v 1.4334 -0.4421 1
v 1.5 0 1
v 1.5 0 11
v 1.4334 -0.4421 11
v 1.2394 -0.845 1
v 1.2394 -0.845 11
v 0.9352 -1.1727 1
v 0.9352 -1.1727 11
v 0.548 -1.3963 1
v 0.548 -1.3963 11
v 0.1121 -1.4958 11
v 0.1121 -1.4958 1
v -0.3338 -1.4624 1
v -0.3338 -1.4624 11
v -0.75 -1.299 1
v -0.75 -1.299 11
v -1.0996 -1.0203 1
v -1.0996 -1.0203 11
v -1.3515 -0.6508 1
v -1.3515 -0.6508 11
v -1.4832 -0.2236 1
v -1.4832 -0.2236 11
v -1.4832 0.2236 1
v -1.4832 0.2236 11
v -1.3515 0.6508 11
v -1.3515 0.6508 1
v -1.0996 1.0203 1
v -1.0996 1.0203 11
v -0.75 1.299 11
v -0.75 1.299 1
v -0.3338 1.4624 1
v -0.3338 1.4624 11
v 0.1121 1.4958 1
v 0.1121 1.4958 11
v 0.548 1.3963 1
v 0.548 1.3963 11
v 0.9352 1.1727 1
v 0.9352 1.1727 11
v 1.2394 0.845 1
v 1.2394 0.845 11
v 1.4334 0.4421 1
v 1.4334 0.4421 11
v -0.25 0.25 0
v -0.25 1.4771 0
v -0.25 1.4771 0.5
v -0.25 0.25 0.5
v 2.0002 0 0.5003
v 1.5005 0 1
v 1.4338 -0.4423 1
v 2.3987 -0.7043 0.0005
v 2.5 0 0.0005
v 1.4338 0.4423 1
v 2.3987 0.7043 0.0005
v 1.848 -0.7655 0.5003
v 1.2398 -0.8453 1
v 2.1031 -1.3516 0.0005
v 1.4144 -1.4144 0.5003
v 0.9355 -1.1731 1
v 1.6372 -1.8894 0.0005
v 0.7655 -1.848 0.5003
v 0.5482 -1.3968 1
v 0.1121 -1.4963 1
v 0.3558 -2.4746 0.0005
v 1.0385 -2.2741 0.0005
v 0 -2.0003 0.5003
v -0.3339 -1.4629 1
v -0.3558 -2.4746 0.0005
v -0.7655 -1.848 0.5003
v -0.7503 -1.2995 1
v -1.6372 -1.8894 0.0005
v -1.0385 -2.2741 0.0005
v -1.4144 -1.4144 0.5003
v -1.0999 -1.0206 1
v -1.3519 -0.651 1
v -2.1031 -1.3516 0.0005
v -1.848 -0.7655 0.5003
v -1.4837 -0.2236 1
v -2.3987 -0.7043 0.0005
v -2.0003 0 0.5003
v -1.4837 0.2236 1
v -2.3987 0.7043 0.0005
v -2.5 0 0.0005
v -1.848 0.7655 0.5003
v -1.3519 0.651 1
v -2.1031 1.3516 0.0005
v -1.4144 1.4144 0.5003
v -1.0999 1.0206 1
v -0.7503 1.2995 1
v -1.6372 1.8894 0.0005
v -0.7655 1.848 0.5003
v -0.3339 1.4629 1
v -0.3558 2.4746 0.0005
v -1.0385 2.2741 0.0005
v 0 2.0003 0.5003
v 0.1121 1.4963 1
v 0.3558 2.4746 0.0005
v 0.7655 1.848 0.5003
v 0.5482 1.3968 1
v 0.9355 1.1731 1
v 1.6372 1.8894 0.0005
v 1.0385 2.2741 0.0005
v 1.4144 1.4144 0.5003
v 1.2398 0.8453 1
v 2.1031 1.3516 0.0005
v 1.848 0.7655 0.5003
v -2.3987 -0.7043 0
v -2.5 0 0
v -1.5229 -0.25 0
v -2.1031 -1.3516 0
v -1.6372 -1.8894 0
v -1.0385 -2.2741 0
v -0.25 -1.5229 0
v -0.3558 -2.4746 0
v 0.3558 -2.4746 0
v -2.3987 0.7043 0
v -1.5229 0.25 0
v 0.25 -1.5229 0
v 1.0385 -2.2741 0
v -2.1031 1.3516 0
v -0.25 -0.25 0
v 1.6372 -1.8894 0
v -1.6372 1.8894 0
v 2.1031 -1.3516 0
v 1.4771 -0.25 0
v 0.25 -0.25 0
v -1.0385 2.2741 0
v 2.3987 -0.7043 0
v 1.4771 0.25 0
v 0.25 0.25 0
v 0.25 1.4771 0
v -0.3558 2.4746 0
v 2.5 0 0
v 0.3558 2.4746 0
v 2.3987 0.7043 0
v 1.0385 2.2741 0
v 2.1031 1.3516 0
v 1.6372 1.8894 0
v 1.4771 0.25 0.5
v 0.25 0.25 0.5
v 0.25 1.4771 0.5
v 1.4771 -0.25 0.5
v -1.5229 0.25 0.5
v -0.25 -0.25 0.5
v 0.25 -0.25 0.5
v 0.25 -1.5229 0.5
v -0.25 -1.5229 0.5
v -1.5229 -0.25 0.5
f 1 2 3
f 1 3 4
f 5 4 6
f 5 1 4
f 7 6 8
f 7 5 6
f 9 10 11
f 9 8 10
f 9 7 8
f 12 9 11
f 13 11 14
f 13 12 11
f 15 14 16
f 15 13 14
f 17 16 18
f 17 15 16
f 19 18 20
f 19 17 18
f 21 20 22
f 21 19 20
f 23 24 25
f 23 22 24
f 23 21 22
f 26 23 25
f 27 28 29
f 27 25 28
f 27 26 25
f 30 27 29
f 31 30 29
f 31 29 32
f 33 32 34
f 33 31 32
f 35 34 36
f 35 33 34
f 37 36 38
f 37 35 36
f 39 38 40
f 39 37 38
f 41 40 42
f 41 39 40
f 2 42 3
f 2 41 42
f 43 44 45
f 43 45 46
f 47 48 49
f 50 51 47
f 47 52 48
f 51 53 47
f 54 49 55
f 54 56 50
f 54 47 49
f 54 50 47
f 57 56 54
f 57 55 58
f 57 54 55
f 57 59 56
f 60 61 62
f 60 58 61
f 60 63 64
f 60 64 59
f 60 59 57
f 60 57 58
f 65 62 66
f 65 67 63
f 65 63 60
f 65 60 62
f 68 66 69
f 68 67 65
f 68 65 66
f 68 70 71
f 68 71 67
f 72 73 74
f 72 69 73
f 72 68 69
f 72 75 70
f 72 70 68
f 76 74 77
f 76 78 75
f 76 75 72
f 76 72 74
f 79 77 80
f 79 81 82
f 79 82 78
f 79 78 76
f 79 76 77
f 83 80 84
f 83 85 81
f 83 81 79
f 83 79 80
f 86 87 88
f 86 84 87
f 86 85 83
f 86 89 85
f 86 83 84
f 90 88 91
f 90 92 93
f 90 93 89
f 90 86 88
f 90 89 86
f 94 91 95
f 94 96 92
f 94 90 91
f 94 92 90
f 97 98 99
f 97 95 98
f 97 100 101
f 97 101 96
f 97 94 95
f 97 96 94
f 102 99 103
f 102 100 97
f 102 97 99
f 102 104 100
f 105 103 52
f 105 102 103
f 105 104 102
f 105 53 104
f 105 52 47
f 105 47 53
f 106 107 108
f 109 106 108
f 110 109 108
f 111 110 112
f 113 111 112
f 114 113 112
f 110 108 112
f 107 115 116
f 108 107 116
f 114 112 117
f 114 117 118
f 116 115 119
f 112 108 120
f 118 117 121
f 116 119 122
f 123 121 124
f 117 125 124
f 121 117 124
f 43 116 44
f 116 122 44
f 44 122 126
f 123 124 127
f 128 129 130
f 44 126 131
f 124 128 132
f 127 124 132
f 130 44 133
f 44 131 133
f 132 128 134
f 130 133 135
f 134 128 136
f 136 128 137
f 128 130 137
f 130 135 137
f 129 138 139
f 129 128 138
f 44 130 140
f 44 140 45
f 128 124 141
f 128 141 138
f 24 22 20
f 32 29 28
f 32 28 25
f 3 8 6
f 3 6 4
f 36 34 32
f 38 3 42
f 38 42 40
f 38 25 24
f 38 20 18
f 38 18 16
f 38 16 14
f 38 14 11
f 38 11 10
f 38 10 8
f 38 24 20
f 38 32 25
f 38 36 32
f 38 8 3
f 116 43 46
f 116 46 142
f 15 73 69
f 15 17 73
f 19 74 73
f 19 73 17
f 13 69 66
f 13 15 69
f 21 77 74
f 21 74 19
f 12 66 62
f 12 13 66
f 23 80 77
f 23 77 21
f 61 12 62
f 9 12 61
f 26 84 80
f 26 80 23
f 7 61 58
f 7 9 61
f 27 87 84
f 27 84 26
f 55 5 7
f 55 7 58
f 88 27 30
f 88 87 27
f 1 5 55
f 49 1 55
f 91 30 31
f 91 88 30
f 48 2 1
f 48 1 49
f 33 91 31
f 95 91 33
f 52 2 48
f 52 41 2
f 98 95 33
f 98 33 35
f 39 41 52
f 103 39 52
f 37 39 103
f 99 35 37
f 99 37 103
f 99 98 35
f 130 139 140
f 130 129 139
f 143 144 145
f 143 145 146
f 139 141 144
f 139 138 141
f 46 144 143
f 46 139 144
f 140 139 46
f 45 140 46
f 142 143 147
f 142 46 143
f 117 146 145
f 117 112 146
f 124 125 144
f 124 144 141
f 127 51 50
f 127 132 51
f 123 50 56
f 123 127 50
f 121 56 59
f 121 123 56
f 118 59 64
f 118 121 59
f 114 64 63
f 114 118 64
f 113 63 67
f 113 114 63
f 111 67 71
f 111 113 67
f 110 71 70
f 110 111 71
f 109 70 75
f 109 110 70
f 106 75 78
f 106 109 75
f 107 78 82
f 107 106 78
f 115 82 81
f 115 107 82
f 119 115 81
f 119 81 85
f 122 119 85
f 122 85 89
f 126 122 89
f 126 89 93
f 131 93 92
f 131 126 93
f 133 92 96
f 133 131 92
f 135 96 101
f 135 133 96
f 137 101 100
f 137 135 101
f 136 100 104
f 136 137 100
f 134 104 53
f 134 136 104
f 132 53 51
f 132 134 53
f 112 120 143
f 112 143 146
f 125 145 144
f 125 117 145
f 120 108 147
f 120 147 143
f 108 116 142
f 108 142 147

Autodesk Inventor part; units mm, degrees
ref_plane "YZ Plane" through (0, 0, 0) normal (1, 0, 0) x (0, 1, 0)
ref_plane "XZ Plane" through (0, 0, 0) normal (0, 1, 0) x (-1, 0, 0)
ref_plane "XY Plane" through (0, 0, 0) normal (0, 0, 1) x (1, 0, 0)
sketch "Sketch1" plane through (0, 0, 0) normal (0, 0, 1) x (1, 0, 0)
  circle A0 centre (0, 0) radius 2.5
  circle A1 centre (0, 0) radius 1.5
  dimension "d0" = 5
  dimension "d1" = 3
extrude "Extrusion1" add sketch "Sketch1" along normal blind 1
extrude "Extrusion2" add sketch "Sketch1" along normal blind 11 contours A1
chamfer "Chamfer1" distance 1 angle 45 1 edges at (-2.5, 0, 1)
sketch "Sketch2" plane through (0, 0, 0) normal (0, 0, -1) x (-1, 0, 0)
  circle A0 centre (0, 0) radius 2.5 projected
  line L0 (0.25, -1.5229) -> (-0.25, -1.5229)
  line L1 (-0.25, 1.4771) -> (0.25, 1.4771)
  line L2 (0.25, -1.4771) -> (-0.25, 1.4771) construction
  line L3 (1.5229, 0.25) -> (1.5229, -0.25)
  line L4 (-1.4771, -0.25) -> (-1.4771, 0.25)
  line L5 (1.4771, 0.25) -> (-1.4771, -0.25) construction
  line L6 (1.5229, -0.25) -> (0.25, -0.25)
  line L7 (-0.25, -0.25) -> (-1.4771, -0.25)
  line L8 (-1.4771, 0.25) -> (-0.25, 0.25)
  line L9 (0.25, 0.25) -> (1.5229, 0.25)
  line L10 (0.25, 1.4771) -> (0.25, 0.25)
  line L11 (0.25, -0.25) -> (0.25, -1.5229)
  line L12 (-0.25, -1.5229) -> (-0.25, -0.25)
  line L13 (-0.25, 0.25) -> (-0.25, 1.4771)
  point P0 (-1.3278, 0)
  dimension "d9" = 0.5
  dimension "d10" = 3
  dimension "d11" = 0.5
  dimension "d12" = 3
extrude "Extrusion3" cut sketch "Sketch2" against normal blind 0.5 contours L0 L12 L7 L4 L8 L13 L1 L10 L9 L3 L6 L11
properties part number "Tornillo tapa"
